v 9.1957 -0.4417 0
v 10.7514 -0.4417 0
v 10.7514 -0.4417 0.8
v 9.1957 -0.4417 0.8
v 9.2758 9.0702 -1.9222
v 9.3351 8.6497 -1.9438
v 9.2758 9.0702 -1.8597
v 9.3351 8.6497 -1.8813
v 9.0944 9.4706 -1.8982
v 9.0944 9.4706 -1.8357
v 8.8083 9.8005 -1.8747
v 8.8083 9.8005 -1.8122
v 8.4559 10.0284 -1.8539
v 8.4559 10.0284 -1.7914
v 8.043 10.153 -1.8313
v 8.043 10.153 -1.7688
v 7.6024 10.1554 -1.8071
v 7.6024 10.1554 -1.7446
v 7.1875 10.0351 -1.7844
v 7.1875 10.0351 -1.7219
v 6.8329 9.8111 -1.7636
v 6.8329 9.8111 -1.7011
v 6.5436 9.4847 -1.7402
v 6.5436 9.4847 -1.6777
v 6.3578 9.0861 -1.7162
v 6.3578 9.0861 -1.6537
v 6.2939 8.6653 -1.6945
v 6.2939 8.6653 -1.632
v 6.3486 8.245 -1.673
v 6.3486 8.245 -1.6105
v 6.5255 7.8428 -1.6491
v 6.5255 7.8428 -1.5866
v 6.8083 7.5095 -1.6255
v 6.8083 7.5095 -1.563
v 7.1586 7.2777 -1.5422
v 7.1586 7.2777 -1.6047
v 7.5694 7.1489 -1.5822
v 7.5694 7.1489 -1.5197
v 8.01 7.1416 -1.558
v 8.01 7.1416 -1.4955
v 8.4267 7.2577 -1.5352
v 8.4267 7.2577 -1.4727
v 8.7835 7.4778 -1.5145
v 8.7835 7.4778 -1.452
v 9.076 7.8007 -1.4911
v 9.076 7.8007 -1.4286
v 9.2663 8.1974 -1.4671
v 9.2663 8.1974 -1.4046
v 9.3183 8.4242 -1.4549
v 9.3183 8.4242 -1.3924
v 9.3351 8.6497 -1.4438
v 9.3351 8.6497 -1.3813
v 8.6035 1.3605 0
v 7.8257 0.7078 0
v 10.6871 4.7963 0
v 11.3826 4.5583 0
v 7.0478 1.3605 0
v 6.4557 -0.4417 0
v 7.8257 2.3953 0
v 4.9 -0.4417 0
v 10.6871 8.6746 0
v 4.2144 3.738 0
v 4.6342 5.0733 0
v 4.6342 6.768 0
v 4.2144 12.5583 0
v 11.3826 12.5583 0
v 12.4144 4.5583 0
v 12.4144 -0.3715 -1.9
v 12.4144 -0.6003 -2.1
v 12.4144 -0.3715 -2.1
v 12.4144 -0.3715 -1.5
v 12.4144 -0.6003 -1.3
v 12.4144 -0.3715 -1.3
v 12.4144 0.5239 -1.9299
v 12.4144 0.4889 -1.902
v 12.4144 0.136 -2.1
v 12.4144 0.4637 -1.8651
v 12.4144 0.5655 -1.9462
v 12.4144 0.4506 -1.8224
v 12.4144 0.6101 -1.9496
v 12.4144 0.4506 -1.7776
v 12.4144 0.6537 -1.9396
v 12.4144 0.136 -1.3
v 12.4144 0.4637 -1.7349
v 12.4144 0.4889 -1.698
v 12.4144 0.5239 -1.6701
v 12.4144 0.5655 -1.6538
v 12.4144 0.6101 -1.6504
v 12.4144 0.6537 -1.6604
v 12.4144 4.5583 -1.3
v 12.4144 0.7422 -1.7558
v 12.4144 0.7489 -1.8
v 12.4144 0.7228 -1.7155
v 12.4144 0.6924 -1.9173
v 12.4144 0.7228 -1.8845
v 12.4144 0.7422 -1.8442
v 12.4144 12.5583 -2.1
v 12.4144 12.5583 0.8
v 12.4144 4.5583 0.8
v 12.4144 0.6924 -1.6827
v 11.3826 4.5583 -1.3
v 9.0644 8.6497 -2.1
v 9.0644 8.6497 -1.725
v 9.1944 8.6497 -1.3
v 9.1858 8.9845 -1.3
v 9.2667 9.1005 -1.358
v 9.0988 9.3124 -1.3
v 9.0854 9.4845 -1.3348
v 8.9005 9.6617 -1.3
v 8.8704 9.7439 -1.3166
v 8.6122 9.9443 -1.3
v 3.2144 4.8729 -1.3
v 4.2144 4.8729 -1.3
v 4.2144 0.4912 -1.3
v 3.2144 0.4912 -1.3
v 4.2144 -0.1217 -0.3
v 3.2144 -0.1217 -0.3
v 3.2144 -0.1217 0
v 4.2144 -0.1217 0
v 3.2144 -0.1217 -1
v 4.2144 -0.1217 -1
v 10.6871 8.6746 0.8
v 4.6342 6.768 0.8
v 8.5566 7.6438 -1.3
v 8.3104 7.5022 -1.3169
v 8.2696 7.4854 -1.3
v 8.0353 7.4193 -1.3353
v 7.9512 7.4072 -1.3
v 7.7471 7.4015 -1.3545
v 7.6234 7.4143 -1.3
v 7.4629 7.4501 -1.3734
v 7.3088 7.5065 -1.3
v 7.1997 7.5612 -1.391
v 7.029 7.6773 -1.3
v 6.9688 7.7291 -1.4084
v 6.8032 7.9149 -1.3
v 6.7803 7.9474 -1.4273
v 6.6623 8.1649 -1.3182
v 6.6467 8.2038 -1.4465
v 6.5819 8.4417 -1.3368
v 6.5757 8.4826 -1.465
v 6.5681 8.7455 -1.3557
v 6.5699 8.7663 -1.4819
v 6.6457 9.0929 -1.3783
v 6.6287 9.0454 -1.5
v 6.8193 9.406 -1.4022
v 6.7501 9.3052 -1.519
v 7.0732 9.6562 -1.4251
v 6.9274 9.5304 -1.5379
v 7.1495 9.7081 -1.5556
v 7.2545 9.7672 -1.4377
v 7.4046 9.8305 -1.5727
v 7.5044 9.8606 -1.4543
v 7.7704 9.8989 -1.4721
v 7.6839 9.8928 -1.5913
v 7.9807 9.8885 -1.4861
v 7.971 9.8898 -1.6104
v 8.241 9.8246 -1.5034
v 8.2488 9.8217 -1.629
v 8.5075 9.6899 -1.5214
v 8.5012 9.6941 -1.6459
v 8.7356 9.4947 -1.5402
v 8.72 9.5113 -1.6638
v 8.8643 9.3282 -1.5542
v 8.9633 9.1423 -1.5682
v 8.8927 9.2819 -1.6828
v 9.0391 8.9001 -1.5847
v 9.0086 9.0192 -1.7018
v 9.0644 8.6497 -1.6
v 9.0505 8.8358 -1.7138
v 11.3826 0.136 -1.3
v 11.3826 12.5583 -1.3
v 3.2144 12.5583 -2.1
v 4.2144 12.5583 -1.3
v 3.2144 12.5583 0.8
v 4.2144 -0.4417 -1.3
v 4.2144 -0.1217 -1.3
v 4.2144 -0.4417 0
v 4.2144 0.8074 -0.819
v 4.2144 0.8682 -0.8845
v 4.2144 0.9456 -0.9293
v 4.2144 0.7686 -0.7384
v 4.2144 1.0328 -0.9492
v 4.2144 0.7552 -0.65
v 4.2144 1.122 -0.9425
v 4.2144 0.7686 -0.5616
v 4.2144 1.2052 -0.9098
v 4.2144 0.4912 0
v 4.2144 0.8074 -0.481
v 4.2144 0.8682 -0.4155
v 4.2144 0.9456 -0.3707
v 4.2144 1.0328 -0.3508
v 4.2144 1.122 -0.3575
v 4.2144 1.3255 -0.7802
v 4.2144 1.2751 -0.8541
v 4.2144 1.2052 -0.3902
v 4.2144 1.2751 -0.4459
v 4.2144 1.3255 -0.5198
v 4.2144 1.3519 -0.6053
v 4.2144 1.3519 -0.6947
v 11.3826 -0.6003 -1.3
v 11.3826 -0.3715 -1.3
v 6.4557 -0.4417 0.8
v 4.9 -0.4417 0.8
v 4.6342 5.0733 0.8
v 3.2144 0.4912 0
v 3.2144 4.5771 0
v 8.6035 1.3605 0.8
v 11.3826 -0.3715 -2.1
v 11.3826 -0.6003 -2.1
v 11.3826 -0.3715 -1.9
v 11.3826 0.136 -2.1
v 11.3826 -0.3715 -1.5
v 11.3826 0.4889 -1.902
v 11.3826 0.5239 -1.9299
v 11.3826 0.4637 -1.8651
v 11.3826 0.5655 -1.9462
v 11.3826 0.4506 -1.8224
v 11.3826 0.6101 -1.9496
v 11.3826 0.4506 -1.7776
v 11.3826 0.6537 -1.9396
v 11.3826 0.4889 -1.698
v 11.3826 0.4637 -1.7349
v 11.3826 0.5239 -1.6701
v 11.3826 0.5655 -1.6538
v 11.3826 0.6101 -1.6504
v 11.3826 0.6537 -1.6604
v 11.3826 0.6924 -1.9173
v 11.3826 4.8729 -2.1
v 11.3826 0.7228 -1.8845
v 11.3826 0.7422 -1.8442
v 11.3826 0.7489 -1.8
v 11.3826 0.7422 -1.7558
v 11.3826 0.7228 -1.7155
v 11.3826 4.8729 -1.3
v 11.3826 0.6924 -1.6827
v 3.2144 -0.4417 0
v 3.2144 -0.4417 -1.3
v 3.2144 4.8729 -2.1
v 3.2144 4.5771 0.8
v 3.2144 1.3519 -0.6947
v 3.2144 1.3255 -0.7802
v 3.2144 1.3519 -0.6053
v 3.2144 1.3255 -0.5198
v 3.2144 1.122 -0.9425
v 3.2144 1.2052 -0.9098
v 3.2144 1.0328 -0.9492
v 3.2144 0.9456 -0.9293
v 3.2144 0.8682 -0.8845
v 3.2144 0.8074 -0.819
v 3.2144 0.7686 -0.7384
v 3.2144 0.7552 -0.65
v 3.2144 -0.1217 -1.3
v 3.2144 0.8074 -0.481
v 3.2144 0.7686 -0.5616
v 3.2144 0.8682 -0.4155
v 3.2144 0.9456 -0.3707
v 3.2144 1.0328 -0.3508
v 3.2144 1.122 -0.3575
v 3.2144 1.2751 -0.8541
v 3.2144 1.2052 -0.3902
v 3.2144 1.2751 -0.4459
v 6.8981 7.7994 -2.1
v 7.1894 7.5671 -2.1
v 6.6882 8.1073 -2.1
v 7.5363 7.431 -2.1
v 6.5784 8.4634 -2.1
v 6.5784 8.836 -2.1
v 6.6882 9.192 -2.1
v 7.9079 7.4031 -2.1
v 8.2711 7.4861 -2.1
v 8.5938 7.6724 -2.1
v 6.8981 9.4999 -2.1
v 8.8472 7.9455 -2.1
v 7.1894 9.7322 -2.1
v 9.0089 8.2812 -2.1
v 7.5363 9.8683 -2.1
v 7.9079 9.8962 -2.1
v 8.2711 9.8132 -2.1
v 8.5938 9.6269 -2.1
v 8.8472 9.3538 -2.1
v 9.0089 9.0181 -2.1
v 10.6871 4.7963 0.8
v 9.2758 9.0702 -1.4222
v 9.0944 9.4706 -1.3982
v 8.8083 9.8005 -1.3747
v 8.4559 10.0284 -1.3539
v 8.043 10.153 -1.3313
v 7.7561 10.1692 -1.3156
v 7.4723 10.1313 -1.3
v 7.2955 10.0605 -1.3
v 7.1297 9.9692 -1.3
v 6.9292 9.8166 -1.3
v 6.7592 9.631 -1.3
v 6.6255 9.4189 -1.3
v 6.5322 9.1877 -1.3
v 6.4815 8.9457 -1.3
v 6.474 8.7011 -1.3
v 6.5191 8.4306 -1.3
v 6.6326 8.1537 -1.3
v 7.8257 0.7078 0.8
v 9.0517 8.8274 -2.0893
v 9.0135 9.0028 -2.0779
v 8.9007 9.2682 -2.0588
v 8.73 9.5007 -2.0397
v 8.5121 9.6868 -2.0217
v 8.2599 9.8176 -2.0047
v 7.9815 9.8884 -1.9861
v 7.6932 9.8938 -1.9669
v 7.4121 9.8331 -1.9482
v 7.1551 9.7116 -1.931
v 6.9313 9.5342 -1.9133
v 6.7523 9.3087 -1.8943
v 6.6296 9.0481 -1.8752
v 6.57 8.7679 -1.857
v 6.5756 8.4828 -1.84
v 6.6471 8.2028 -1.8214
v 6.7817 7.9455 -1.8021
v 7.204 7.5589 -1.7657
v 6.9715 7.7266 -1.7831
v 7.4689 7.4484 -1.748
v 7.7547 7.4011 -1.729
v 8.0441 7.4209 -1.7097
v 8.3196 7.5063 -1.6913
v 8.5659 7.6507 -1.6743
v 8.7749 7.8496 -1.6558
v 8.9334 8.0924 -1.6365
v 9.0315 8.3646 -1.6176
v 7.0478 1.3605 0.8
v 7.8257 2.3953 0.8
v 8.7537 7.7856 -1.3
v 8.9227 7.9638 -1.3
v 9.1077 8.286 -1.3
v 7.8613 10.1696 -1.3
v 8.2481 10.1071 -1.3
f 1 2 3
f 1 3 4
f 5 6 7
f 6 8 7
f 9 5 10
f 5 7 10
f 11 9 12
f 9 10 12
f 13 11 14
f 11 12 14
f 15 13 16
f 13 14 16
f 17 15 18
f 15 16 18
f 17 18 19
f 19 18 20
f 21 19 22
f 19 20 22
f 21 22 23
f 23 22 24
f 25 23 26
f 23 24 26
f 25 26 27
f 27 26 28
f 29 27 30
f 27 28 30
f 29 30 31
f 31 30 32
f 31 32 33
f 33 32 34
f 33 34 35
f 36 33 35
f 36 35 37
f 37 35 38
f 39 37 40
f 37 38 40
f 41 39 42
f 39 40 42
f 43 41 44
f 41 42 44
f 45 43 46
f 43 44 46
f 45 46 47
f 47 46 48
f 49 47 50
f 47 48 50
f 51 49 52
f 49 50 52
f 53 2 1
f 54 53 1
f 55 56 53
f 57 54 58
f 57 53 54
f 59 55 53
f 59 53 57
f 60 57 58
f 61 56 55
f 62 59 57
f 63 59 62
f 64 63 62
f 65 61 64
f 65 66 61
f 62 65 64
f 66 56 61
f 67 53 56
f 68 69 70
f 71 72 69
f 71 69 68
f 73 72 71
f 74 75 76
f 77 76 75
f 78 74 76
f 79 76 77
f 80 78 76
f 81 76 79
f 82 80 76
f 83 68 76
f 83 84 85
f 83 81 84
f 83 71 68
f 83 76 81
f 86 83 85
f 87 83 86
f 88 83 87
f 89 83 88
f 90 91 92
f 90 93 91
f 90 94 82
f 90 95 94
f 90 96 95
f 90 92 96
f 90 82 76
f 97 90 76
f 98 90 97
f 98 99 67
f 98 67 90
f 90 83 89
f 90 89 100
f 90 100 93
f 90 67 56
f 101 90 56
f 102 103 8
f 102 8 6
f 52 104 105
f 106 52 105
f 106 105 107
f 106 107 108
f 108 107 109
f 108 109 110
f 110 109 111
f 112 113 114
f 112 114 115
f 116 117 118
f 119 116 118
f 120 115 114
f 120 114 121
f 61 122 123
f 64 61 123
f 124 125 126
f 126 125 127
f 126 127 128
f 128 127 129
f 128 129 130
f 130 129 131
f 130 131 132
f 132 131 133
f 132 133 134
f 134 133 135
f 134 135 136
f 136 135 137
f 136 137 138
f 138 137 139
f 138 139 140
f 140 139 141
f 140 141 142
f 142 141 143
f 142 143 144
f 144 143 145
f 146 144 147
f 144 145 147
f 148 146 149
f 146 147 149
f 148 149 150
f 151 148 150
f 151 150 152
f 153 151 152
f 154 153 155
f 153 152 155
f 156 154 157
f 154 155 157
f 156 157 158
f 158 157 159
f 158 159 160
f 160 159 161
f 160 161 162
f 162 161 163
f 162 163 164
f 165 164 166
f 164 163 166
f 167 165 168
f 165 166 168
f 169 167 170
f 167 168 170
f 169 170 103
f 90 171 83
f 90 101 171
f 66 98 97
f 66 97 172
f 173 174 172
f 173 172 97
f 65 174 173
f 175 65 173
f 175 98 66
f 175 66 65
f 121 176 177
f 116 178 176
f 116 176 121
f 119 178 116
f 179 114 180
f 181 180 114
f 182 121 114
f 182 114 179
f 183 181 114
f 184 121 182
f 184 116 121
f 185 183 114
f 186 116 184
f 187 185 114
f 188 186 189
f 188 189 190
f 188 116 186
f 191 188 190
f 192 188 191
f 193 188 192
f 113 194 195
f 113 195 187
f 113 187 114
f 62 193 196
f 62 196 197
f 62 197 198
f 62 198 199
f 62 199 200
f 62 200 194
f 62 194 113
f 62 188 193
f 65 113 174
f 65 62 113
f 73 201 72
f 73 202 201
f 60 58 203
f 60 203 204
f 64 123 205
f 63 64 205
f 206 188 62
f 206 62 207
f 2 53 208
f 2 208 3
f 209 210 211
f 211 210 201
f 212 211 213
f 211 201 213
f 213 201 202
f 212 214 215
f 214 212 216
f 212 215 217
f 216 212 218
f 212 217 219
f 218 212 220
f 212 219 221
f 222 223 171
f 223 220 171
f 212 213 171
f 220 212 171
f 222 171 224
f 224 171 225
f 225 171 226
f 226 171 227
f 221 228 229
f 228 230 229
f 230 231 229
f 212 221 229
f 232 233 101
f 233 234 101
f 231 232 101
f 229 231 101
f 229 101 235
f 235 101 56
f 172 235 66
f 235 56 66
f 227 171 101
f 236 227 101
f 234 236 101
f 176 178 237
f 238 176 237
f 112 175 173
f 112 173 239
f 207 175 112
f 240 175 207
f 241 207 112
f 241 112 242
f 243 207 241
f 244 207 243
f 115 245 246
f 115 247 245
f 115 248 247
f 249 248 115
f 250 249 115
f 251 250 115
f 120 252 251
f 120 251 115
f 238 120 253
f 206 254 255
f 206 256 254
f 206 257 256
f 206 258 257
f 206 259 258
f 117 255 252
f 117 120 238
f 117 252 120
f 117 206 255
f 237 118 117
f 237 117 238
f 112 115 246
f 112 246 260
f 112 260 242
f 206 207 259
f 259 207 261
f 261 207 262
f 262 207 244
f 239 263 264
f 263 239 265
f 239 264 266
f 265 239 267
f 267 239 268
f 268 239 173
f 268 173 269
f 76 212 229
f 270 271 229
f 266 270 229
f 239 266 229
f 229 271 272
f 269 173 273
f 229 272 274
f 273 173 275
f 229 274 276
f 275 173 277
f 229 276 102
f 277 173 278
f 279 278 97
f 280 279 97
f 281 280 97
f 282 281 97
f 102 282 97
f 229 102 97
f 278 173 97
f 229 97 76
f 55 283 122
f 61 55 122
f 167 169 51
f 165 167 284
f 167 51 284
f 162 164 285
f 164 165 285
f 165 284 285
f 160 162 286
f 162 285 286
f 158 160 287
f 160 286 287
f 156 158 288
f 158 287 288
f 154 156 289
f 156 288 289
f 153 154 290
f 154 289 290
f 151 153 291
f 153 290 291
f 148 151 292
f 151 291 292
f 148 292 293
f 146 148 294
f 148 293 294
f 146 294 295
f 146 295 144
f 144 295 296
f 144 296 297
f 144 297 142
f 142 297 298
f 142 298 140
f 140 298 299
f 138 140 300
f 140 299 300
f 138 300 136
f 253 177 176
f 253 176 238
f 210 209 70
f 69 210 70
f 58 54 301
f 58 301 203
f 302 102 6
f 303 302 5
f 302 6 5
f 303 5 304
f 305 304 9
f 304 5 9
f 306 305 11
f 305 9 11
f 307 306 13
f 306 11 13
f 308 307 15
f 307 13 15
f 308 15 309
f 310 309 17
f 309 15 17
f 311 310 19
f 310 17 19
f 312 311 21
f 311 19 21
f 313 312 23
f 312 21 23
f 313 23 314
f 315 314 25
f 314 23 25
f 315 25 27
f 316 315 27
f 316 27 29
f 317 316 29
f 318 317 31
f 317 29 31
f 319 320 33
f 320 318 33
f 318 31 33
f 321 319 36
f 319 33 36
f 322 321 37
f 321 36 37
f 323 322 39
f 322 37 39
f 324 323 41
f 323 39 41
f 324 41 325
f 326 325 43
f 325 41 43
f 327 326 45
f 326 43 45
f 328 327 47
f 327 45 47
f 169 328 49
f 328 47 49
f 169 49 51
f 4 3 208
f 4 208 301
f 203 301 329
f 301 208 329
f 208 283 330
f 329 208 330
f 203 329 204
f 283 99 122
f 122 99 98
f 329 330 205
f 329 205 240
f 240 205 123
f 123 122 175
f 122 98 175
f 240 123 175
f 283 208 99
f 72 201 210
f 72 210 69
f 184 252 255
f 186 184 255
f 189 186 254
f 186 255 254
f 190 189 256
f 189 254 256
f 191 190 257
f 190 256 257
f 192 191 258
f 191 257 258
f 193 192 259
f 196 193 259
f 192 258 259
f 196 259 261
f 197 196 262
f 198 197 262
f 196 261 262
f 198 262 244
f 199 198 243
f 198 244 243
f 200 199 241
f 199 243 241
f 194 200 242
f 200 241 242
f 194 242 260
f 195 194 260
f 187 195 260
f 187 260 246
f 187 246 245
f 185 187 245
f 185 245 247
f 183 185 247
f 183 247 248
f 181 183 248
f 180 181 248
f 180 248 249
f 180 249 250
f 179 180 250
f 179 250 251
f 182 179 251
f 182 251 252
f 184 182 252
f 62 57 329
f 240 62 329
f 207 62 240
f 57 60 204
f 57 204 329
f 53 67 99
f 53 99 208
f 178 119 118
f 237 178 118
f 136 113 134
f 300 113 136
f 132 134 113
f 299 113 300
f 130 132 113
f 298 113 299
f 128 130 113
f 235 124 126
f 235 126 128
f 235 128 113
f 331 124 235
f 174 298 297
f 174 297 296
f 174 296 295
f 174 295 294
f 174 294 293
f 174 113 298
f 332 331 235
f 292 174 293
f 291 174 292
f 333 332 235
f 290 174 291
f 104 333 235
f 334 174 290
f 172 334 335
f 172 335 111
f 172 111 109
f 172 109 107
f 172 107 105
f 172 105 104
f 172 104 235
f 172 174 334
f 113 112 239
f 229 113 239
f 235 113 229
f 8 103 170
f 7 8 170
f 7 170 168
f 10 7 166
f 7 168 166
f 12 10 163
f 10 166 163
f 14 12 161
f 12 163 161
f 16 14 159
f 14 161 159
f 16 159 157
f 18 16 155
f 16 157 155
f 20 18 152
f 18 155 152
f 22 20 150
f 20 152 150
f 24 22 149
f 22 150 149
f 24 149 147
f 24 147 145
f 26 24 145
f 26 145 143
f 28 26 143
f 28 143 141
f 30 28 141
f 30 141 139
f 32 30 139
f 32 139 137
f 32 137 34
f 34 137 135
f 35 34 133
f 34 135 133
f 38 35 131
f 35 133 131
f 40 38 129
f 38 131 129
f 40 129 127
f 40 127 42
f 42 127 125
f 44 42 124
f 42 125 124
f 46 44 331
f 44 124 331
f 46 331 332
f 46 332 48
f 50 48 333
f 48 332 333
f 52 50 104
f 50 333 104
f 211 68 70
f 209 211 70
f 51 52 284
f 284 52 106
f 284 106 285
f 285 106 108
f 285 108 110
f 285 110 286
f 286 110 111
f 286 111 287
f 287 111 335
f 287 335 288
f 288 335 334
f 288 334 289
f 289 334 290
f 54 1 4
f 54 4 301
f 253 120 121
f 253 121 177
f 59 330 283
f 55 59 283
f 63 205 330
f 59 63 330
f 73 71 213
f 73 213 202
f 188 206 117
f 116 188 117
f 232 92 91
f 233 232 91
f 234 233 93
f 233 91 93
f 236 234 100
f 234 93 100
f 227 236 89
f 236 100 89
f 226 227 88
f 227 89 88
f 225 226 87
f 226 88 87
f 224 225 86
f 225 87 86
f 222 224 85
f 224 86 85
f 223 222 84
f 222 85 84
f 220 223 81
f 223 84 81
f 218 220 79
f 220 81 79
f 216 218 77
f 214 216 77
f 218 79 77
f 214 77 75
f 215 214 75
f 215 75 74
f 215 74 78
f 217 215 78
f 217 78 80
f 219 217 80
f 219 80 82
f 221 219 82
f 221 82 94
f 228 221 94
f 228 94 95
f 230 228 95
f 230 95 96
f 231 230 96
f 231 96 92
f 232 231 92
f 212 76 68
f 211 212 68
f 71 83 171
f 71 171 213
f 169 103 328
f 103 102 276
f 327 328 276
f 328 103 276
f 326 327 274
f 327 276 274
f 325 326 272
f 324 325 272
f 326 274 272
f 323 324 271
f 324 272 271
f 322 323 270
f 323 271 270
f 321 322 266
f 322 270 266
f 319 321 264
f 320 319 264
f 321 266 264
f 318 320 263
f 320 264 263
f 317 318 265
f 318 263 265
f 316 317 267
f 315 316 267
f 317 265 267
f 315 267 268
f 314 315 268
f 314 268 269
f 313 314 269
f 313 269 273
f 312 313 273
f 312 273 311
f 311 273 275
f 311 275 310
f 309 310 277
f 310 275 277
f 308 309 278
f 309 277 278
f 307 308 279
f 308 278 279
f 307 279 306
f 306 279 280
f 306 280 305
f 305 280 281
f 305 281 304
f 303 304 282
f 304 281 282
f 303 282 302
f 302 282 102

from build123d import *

# Parameters (mm, degrees)
BOSS_EXTRUDE1_DEPTH   = 0.8
SKETCH5_W             = 1
SKETCH5_H             = 13
SKETCH5_W_2           = 1.031823626
SKETCH5_H_2           = 8
BOSS_EXTRUDE2_DEPTH   = 1.3
BOSS_EXTRUDE3_DEPTH   = 0.8
M3_TAPPED_HOLE1_D     = 2.5
M3_TAPPED_HOLE1_DEPTH = 0.8
THREAD2_PITCH         = 0.5
CUT_EXTRUDE1_REACH    = 17.709
SKETCH12_R            = 0.3
CUT_EXTRUDE2_REACH    = 19.895
CUT_EXTRUDE3_REACH    = 17.709
SKETCH14_R            = 0.15


with BuildPart() as part:
    # Sketch1 → Boss-Extrude1 (new body)
    with BuildSketch(Plane.XY):
        Polygon((3.214446547, 12.558271664), (12.414446547, 12.558271664), (12.414446547, 4.558271664), (8.603545102, 1.360545667), (10.75141162, -0.441728336), (9.195687793, -0.441728336), (7.825683188, 0.707842022), (6.455678584, -0.441728336), (4.899954757, -0.441728336), (7.047821275, 1.360545667), (3.214446547, 4.577128987), align=None)
    extrude(amount=BOSS_EXTRUDE1_DEPTH)

    # Sketch5 → Boss-Extrude2 (add)
    with BuildSketch(Plane(origin=(0, 0, 0), x_dir=(-1, 0, 0), z_dir=(0, 0, -1))):
        with Locations((-3.714446547, 6.058271664)):
            Rectangle(SKETCH5_W, SKETCH5_H)
        with Locations((-11.898534734, 8.558271664)):
            Rectangle(SKETCH5_W_2, SKETCH5_H_2)
    extrude(amount=BOSS_EXTRUDE2_DEPTH)

    # Sketch8 → Boss-Extrude3 (add)
    with BuildSketch(Plane(origin=(0, 0, -1.3), x_dir=(-1, 0, 0), z_dir=(0, 0, -1))):
        Polygon((-12.414446547, 12.558271664), (-3.214446547, 12.558271664), (-3.214446547, 4.872903055), (-11.382622921, 4.872903055), (-11.382622921, -0.60025791), (-12.414446547, -0.60025791), align=None)
    extrude(amount=BOSS_EXTRUDE3_DEPTH)

    # M3 Tapped Hole1
    with Locations(Plane(origin=(0, 0, -1.3), x_dir=(-1, 0, 0), z_dir=(0, 0, 1))):
        with Locations((-7.814446547, -8.649654686)):
            Hole(M3_TAPPED_HOLE1_D / 2, depth=M3_TAPPED_HOLE1_DEPTH)

    # Thread2: the profile of Thread Profile4 profile screwed along a right-hand helix of 1.6 turns, 6 arcs to a turn; built about Z, then put on its axis
    thread2_z = Axis((0, 0, 0), (0, 0, 1))
    thread2_corners = [(1.2497, 0, -0.000173205), (1.520632937, 0, 0.156249999), (1.520632937, 0, 0.218749999), (1.2497, 0, 0.375173204)]
    with BuildLine(mode=Mode.PRIVATE) as thread2_profile:
        Line(thread2_corners[0], thread2_corners[1])
        Line(thread2_corners[1], thread2_corners[2])
        Line(thread2_corners[2], thread2_corners[3])
        Line(thread2_corners[3], thread2_corners[0])
    thread2_cap = Face(thread2_profile.wire())
    thread2_turn_angles = [0, 30, 60, 90, 120, 150, 180, 210, 240, 270, 300, 330, 360]
    thread2_turn_weights = [1, 0.8660254037844387, 1, 0.8660254037844387, 1, 0.8660254037844387, 1, 0.8660254037844387, 1, 0.8660254037844387, 1, 0.8660254037844387, 1]
    thread2_turn_rails = [Edge.make_bspline([Vector(p[0], p[1], 0).rotate(thread2_z, thread2_turn_angles[k]) / thread2_turn_weights[k] + Vector(0, 0, p[2] + THREAD2_PITCH * thread2_turn_angles[k] / 360) for k in range(13)], [0, 0, 0, 1, 1, 2, 2, 3, 3, 4, 4, 5, 5, 6, 6, 6], 2, thread2_turn_weights) for p in thread2_corners]
    thread2_turn_sides = [Face.make_surface_from_curves(thread2_turn_rails[p[0]], thread2_turn_rails[p[1]]) for p in [(0, 1), (1, 2), (2, 3), (3, 0)]]
    thread2_last_angles = [360, 390, 420, 450, 480, 510, 540, 558, 576]
    thread2_last_weights = [1, 0.8660254037844387, 1, 0.8660254037844387, 1, 0.8660254037844387, 1, 0.9510565162951535, 1]
    thread2_last_rails = [Edge.make_bspline([Vector(p[0], p[1], 0).rotate(thread2_z, thread2_last_angles[k]) / thread2_last_weights[k] + Vector(0, 0, p[2] + THREAD2_PITCH * thread2_last_angles[k] / 360) for k in range(9)], [0, 0, 0, 1, 1, 2, 2, 3, 3, 4, 4, 4], 2, thread2_last_weights) for p in thread2_corners]
    thread2_last_sides = [Face.make_surface_from_curves(thread2_last_rails[p[0]], thread2_last_rails[p[1]]) for p in [(0, 1), (1, 2), (2, 3), (3, 0)]]
    thread2 = Plane(origin=(7.814446547, 8.649654686, -2.1), x_dir=(1, 0, 0), z_dir=(0, 0, 1)) * Solid(Shell([*thread2_turn_sides, *thread2_last_sides, thread2_cap, thread2_cap.rotate(thread2_z, 576).moved(Location((0, 0, THREAD2_PITCH * 576 / 360)))]))
    add(thread2, mode=Mode.SUBTRACT)

    # Sketch12 → Cut-Extrude1 (cut, up to next)
    with BuildSketch(Plane.ZY.offset(-3.214446547), mode=Mode.PRIVATE) as cut_extrude1_sk1:
        with Locations(Location((-0.65, 1.055227185, 0), (0, 0, 270))):
            Circle(SKETCH12_R)
    cut_extrude1_tool1 = extrude(cut_extrude1_sk1.sketch, amount=-CUT_EXTRUDE1_REACH, mode=Mode.PRIVATE) & part.part
    # Sketch12 → Cut-Extrude1 (cut, up to next)
    with BuildSketch(Plane.ZY.offset(-3.214446547), mode=Mode.PRIVATE) as cut_extrude1_sk2:
        Polygon((-1.3, 0.491189657), (-1, -0.121721645), (-1.3, -0.121721645), align=None)
    cut_extrude1_tool2 = extrude(cut_extrude1_sk2.sketch, amount=-CUT_EXTRUDE1_REACH, mode=Mode.PRIVATE) & part.part
    # Sketch12 → Cut-Extrude1 (cut, up to next)
    with BuildSketch(Plane.ZY.offset(-3.214446547), mode=Mode.PRIVATE) as cut_extrude1_sk3:
        Polygon((0, 0.491189657), (-0.3, -0.121721645), (0, -0.121721645), align=None)
    cut_extrude1_tool3 = extrude(cut_extrude1_sk3.sketch, amount=-CUT_EXTRUDE1_REACH, mode=Mode.PRIVATE) & part.part
    add(cut_extrude1_tool1.solids().sort_by_distance((3.214447, 1.055227, -0.65))[0], mode=Mode.SUBTRACT)
    add(cut_extrude1_tool2.solids().sort_by_distance((3.214447, 0.082582, -1.2))[0], mode=Mode.SUBTRACT)
    add(cut_extrude1_tool3.solids().sort_by_distance((3.214447, 0.082582, -0.1))[0], mode=Mode.SUBTRACT)

    # Sketch13 → Cut-Extrude2 (cut, up to next)
    with BuildSketch(Plane.XY.offset(0.8), mode=Mode.PRIVATE) as cut_extrude2_sk1:
        Polygon((4.634176401, 6.767991384), (4.634176401, 5.073282991), (7.825683188, 2.395290823), (10.687148853, 4.796345607), (10.687148853, 8.674644795), align=None)
    cut_extrude2_tool1 = extrude(cut_extrude2_sk1.sketch, amount=-CUT_EXTRUDE2_REACH, mode=Mode.PRIVATE) & part.part
    add(cut_extrude2_tool1.solids().sort_by_distance((7.949639, 5.66496, 0.8))[0], mode=Mode.SUBTRACT)

    # Sketch14 → Cut-Extrude3 (cut, up to next)
    with BuildSketch(Plane(origin=(12.414446547, 0, 0), x_dir=(0, 0, -1), z_dir=(1, 0, 0)), mode=Mode.PRIVATE) as cut_extrude3_sk1:
        with Locations(Location((1.8, 0.598886989, 0), (0, 0, 90))):
            Circle(SKETCH14_R)
    cut_extrude3_tool1 = extrude(cut_extrude3_sk1.sketch, amount=-CUT_EXTRUDE3_REACH, mode=Mode.PRIVATE) & part.part
    # Sketch14 → Cut-Extrude3 (cut, up to next)
    with BuildSketch(Plane(origin=(12.414446547, 0, 0), x_dir=(0, 0, -1), z_dir=(1, 0, 0)), mode=Mode.PRIVATE) as cut_extrude3_sk2:
        Polygon((1.3, 0.13596653), (1.5, -0.371538896), (1.3, -0.371538896), align=None)
    cut_extrude3_tool2 = extrude(cut_extrude3_sk2.sketch, amount=-CUT_EXTRUDE3_REACH, mode=Mode.PRIVATE) & part.part
    # Sketch14 → Cut-Extrude3 (cut, up to next)
    with BuildSketch(Plane(origin=(12.414446547, 0, 0), x_dir=(0, 0, -1), z_dir=(1, 0, 0)), mode=Mode.PRIVATE) as cut_extrude3_sk3:
        Polygon((2.1, 0.13596653), (1.9, -0.371538896), (2.1, -0.371538896), align=None)
    cut_extrude3_tool3 = extrude(cut_extrude3_sk3.sketch, amount=-CUT_EXTRUDE3_REACH, mode=Mode.PRIVATE) & part.part
    add(cut_extrude3_tool1.solids().sort_by_distance((12.414447, 0.598887, -1.8))[0], mode=Mode.SUBTRACT)
    add(cut_extrude3_tool2.solids().sort_by_distance((12.414447, -0.20237, -1.366667))[0], mode=Mode.SUBTRACT)
    add(cut_extrude3_tool3.solids().sort_by_distance((12.414447, -0.20237, -2.033333))[0], mode=Mode.SUBTRACT)


solid = part.part
